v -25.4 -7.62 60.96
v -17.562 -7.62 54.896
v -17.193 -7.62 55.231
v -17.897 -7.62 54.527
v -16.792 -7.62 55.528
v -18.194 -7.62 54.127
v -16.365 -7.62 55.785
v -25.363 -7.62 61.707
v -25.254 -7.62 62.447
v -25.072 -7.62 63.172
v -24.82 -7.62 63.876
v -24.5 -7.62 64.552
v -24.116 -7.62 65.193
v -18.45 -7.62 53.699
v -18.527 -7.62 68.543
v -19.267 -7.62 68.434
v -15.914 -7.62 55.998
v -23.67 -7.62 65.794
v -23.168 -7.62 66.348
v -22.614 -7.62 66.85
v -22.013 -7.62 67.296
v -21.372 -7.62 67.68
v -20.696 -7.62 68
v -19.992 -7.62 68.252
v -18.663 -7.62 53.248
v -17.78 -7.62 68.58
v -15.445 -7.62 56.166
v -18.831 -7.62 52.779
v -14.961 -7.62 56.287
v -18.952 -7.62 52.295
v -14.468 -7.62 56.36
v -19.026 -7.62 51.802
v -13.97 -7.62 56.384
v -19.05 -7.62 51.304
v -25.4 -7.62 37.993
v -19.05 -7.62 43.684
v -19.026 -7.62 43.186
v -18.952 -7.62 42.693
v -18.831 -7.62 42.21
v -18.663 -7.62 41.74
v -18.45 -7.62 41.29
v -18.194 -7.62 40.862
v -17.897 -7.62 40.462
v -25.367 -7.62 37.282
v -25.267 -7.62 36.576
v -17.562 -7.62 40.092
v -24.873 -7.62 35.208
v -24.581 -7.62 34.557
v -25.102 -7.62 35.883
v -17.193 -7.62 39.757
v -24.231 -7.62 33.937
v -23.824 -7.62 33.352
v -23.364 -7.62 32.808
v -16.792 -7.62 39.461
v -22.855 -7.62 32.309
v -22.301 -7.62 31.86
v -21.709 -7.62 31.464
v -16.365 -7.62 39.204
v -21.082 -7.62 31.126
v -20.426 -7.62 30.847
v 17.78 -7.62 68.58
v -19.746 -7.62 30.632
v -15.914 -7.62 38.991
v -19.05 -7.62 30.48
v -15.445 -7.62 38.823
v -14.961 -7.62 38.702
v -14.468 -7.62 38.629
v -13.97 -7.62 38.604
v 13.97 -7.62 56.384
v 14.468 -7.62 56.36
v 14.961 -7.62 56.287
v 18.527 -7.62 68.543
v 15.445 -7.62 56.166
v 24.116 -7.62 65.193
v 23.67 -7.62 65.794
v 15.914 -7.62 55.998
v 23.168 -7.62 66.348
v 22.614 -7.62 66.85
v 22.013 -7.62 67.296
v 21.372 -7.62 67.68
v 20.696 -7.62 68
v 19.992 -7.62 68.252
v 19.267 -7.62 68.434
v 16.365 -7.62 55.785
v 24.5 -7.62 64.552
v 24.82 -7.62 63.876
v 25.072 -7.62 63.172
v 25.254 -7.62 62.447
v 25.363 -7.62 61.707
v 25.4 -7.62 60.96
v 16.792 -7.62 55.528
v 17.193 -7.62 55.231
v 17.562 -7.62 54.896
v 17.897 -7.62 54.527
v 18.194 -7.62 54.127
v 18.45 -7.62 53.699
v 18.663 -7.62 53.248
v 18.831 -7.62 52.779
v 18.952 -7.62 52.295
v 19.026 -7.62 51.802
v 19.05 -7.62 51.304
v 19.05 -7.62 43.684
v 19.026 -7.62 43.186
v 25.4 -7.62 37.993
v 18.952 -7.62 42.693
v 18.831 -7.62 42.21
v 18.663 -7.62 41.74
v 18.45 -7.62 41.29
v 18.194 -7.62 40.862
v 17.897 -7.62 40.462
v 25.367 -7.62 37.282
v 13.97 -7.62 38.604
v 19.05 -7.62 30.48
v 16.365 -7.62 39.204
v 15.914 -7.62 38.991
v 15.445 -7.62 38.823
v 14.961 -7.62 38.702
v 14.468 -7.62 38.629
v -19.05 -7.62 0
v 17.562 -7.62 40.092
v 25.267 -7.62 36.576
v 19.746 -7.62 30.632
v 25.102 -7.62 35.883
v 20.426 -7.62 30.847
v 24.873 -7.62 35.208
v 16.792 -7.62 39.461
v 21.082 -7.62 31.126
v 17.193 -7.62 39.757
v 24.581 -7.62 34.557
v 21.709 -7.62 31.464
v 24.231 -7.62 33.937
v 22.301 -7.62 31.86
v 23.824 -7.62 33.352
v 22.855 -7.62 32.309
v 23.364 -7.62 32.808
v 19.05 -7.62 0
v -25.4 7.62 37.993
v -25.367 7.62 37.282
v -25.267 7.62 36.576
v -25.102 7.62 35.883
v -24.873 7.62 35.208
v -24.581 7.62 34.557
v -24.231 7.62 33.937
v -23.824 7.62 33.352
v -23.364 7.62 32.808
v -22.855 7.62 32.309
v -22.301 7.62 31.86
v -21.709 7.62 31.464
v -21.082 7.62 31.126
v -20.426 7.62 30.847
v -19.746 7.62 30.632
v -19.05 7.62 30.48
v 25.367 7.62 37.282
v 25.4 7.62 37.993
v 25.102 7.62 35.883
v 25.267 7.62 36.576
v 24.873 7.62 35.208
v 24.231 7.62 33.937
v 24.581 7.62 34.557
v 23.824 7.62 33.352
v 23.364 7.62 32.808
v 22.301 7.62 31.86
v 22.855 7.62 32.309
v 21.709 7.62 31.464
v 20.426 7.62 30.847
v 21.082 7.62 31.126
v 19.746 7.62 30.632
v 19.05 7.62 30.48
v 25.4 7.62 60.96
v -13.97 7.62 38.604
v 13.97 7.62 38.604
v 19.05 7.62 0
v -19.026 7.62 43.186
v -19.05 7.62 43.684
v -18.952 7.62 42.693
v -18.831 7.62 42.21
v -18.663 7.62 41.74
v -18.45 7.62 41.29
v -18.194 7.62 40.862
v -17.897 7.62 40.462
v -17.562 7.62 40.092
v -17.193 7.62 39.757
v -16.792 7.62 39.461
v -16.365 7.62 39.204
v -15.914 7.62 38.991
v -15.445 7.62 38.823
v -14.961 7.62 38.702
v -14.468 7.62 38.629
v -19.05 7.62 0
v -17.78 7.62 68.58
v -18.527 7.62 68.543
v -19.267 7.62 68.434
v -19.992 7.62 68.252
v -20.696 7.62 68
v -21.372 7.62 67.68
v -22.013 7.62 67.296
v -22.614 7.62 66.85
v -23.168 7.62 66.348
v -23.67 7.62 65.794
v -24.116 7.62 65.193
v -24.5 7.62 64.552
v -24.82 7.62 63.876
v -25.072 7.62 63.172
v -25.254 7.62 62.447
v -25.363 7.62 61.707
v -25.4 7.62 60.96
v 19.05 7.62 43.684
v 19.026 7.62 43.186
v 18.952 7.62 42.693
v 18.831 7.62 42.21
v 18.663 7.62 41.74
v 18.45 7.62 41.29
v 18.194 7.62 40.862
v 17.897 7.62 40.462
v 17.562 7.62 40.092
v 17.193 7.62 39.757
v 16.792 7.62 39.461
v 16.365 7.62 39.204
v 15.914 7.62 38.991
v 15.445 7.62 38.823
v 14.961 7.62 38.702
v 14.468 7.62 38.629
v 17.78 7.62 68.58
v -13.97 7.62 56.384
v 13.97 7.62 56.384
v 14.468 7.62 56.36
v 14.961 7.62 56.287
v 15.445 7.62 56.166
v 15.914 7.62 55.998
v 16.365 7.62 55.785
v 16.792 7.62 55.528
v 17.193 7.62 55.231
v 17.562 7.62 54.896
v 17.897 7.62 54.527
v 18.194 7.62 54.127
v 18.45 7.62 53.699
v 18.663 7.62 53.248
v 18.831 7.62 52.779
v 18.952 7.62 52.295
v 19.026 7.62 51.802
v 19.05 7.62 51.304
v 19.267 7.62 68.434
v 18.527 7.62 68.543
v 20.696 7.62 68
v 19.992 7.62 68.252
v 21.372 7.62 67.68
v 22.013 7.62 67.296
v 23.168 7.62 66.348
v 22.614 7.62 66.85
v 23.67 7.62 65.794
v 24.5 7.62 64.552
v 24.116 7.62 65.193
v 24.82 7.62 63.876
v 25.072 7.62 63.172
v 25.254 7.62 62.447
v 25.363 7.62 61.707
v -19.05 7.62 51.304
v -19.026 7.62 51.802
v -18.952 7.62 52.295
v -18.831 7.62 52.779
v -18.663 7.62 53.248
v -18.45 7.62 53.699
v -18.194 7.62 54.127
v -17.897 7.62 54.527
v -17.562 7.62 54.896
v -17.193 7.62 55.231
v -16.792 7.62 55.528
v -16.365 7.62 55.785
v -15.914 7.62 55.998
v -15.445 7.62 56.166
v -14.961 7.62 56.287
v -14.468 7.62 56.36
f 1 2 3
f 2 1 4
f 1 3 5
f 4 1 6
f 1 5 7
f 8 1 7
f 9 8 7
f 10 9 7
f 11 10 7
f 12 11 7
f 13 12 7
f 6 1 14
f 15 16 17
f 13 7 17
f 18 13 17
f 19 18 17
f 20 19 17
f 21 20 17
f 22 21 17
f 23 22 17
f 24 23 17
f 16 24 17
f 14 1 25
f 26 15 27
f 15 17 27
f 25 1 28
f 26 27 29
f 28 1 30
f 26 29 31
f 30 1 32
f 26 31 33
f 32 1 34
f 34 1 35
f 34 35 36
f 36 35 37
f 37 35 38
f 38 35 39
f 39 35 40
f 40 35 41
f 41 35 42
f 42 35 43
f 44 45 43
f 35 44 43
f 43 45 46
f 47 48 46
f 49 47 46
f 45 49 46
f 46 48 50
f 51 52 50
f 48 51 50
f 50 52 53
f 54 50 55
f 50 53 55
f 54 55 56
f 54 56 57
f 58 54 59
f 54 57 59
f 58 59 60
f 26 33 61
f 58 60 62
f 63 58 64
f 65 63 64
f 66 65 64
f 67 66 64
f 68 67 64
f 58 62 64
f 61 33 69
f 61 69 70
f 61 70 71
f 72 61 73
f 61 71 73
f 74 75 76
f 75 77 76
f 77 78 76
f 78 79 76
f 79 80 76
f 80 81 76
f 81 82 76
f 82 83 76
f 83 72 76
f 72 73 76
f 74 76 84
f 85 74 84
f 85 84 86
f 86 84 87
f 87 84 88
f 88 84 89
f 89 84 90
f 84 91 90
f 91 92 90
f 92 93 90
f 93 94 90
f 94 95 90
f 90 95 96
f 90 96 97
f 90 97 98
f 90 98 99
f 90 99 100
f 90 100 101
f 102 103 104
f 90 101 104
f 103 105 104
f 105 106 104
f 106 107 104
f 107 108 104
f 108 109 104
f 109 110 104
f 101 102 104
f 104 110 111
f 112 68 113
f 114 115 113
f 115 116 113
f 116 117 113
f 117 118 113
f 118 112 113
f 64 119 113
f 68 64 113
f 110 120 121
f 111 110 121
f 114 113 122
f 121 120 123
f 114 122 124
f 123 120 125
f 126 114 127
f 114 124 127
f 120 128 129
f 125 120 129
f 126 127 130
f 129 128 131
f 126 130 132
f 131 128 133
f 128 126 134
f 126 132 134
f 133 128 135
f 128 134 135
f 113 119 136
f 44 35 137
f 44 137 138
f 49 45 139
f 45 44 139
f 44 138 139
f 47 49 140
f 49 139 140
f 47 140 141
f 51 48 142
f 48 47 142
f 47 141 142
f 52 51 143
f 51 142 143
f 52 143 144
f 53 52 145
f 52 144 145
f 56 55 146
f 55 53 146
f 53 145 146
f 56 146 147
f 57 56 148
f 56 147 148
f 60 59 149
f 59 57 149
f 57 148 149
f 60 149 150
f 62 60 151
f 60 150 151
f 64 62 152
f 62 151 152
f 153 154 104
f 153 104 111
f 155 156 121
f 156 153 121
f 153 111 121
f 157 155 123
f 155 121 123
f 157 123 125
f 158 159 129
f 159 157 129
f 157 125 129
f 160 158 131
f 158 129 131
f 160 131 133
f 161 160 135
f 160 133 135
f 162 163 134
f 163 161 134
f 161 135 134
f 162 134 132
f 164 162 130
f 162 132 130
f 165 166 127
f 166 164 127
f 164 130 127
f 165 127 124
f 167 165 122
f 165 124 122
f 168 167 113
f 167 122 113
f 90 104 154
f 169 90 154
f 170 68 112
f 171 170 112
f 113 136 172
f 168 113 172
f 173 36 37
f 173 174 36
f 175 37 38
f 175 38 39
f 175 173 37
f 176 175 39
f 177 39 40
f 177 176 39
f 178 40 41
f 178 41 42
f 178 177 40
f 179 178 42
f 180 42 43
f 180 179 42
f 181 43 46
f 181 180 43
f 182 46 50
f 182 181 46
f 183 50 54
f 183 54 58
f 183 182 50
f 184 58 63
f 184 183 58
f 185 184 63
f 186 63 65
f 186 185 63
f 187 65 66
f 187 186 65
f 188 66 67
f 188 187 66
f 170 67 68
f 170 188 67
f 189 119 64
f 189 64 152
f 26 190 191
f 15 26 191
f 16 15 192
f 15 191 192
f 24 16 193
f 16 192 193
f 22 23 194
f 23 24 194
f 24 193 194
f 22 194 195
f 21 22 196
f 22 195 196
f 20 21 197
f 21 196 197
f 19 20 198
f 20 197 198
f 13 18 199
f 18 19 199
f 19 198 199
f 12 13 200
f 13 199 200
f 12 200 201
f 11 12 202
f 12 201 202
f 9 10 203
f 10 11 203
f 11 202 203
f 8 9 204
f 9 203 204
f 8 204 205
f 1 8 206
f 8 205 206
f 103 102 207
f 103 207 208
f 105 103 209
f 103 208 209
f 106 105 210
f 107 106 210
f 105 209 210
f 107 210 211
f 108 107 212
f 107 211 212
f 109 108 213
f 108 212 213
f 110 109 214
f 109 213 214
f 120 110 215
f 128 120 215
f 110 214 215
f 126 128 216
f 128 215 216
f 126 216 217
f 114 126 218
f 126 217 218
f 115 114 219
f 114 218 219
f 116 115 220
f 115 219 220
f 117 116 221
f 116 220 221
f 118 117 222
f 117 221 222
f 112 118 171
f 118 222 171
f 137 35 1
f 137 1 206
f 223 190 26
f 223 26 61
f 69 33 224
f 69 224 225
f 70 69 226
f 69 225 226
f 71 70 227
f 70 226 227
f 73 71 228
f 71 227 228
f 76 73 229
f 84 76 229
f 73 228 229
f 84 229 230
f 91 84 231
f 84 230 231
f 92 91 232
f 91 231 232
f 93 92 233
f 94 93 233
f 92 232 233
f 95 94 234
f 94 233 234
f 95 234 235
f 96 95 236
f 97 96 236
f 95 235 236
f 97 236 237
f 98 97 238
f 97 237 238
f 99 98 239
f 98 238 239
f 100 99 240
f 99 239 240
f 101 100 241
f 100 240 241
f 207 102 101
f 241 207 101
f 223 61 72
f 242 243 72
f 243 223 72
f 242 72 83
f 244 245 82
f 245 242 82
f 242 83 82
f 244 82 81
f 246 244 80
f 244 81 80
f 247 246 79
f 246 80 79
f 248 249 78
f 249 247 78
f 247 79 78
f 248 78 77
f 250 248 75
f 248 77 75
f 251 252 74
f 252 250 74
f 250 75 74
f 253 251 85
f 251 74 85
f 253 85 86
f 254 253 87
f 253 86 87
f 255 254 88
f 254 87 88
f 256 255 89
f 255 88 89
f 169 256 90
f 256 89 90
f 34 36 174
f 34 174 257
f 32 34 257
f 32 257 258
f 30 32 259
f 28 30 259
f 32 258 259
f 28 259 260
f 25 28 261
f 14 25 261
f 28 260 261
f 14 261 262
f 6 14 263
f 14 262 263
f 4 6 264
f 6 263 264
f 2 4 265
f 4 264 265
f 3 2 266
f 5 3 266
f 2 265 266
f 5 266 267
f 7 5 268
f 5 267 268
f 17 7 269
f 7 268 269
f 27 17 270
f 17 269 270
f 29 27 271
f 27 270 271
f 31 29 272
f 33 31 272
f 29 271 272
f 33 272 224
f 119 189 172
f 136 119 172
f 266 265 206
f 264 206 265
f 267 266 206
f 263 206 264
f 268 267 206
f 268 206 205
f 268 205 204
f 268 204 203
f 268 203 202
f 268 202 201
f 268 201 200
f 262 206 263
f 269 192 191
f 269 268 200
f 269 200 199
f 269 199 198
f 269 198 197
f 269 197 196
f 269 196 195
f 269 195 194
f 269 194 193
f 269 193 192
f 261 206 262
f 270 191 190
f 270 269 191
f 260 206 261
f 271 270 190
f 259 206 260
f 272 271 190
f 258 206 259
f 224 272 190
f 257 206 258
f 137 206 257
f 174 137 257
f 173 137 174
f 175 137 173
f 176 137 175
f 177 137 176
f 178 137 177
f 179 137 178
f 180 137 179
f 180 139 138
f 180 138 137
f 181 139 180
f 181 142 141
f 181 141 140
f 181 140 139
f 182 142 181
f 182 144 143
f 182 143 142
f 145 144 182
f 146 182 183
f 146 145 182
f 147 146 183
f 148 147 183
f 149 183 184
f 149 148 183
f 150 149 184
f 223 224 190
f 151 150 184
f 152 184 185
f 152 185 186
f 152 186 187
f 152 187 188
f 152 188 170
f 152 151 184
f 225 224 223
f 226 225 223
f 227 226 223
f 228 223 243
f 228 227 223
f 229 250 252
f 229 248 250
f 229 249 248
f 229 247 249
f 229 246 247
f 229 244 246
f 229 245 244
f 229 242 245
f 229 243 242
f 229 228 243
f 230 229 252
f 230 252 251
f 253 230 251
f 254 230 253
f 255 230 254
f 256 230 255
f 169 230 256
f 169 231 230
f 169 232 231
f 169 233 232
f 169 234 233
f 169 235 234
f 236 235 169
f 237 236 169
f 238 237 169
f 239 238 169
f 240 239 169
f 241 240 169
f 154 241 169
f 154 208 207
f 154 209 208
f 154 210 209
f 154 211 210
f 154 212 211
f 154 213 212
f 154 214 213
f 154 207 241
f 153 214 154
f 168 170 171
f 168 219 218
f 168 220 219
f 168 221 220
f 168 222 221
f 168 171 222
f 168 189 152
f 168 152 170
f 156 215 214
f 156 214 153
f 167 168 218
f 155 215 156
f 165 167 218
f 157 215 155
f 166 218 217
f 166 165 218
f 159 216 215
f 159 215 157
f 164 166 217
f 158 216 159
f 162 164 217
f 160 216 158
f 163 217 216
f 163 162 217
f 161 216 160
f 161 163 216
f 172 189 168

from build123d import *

# Parameters (mm, degrees)
SKETCH1_W           = 38.1
SKETCH1_H           = 15.24
BOSS_EXTRUDE2_DEPTH = 30.48
SKETCH2_W           = 50.8
SKETCH2_H           = 15.24
BOSS_EXTRUDE3_DEPTH = 38.1
SKETCH3_W           = 38.1
SKETCH3_H           = 17.78
CUT_EXTRUDE1_DEPTH  = 75.703641143
FILLET1_R           = 5.08
FILLET2_R           = 7.62


with BuildPart() as part:
    # Sketch1 → Boss-Extrude2 (new body)
    with BuildSketch(Plane.XY):
        Rectangle(SKETCH1_W, SKETCH1_H)
    extrude(amount=BOSS_EXTRUDE2_DEPTH)

    # Sketch2 → Boss-Extrude3 (add)
    with BuildSketch(Plane.XY.offset(30.48)):
        Rectangle(SKETCH2_W, SKETCH2_H)
    extrude(amount=BOSS_EXTRUDE3_DEPTH)

    # Sketch3 → Cut-Extrude1 (cut, through all)
    with BuildSketch(Plane.XZ.offset(7.62)):
        with Locations((0, 47.494377682)):
            Rectangle(SKETCH3_W, SKETCH3_H)
    extrude(amount=-CUT_EXTRUDE1_DEPTH, mode=Mode.SUBTRACT)

    # Fillet1
    fillet1_edges = [part.edges().sort_by_distance(p)[0] for p in [
        (-19.05, 0, 38.604377682),
        (-19.05, 0, 56.384377682),
        (19.05, 0, 56.384377682),
        (19.05, 0, 38.604377682),
    ]]
    fillet(fillet1_edges, radius=FILLET1_R)

    # Fillet2
    # the kernel refuses this fillet: 7.62 mm, written as the material it takes off along each edge
    with BuildSketch(Plane(origin=(-25.4, 26.403553311, 30.48), x_dir=(0, 0, 1), z_dir=(0, -1, 0)), Plane(origin=(25.4, -26.403553311, 30.48), x_dir=(0, 0, 1), z_dir=(0, 1, 0))) as fillet2_piece_1:
        with BuildLine():
            CenterArc((7.513421325, -7.62), FILLET2_R, 90, 80.405931773)
            Line((0, -6.35), (-0.150268426, -6.3246))
            ThreePointArc((-0.150268426, -6.3246), (-0.1524, -3.175), (-0.1524, 0))
            Line((-0.1524, 0), (0, 0.1524))
            Line((0, 0.1524), (7.513421325, 0.1524))
            Line((7.513421325, 0.1524), (7.513421325, 0))
        make_face()
    extrude(amount=52.807106623, mode=Mode.SUBTRACT)
    with BuildSketch(Plane(origin=(25.4, -26.67, 68.58), x_dir=(-1, 0, 0), z_dir=(0, 1, 0))) as fillet2_piece_2:
        with BuildLine():
            CenterArc((FILLET2_R, -FILLET2_R), FILLET2_R, 90, 90)
            Line((0, -FILLET2_R), (-FILLET2_R * 0.02, -FILLET2_R))
            Line((-FILLET2_R * 0.02, -FILLET2_R), (-FILLET2_R * 0.02, FILLET2_R * 0.02))
            Line((-FILLET2_R * 0.02, FILLET2_R * 0.02), (FILLET2_R, FILLET2_R * 0.02))
            Line((FILLET2_R, FILLET2_R * 0.02), (FILLET2_R, 0))
        make_face()
    extrude(amount=53.34, mode=Mode.SUBTRACT)
    with BuildSketch(Plane(origin=(-25.4, 26.67, 68.58), x_dir=(0, 0, -1), z_dir=(0, -1, 0))) as fillet2_piece_3:
        with BuildLine():
            CenterArc((FILLET2_R, FILLET2_R), FILLET2_R, 180, 90)
            Line((0, FILLET2_R), (-FILLET2_R * 0.02, FILLET2_R))
            Line((-FILLET2_R * 0.02, FILLET2_R), (-FILLET2_R * 0.02, -FILLET2_R * 0.02))
            Line((-FILLET2_R * 0.02, -FILLET2_R * 0.02), (FILLET2_R, -FILLET2_R * 0.02))
            Line((FILLET2_R, -FILLET2_R * 0.02), (FILLET2_R, 0))
        make_face()
    extrude(amount=53.34, mode=Mode.SUBTRACT)


solid = part.part
